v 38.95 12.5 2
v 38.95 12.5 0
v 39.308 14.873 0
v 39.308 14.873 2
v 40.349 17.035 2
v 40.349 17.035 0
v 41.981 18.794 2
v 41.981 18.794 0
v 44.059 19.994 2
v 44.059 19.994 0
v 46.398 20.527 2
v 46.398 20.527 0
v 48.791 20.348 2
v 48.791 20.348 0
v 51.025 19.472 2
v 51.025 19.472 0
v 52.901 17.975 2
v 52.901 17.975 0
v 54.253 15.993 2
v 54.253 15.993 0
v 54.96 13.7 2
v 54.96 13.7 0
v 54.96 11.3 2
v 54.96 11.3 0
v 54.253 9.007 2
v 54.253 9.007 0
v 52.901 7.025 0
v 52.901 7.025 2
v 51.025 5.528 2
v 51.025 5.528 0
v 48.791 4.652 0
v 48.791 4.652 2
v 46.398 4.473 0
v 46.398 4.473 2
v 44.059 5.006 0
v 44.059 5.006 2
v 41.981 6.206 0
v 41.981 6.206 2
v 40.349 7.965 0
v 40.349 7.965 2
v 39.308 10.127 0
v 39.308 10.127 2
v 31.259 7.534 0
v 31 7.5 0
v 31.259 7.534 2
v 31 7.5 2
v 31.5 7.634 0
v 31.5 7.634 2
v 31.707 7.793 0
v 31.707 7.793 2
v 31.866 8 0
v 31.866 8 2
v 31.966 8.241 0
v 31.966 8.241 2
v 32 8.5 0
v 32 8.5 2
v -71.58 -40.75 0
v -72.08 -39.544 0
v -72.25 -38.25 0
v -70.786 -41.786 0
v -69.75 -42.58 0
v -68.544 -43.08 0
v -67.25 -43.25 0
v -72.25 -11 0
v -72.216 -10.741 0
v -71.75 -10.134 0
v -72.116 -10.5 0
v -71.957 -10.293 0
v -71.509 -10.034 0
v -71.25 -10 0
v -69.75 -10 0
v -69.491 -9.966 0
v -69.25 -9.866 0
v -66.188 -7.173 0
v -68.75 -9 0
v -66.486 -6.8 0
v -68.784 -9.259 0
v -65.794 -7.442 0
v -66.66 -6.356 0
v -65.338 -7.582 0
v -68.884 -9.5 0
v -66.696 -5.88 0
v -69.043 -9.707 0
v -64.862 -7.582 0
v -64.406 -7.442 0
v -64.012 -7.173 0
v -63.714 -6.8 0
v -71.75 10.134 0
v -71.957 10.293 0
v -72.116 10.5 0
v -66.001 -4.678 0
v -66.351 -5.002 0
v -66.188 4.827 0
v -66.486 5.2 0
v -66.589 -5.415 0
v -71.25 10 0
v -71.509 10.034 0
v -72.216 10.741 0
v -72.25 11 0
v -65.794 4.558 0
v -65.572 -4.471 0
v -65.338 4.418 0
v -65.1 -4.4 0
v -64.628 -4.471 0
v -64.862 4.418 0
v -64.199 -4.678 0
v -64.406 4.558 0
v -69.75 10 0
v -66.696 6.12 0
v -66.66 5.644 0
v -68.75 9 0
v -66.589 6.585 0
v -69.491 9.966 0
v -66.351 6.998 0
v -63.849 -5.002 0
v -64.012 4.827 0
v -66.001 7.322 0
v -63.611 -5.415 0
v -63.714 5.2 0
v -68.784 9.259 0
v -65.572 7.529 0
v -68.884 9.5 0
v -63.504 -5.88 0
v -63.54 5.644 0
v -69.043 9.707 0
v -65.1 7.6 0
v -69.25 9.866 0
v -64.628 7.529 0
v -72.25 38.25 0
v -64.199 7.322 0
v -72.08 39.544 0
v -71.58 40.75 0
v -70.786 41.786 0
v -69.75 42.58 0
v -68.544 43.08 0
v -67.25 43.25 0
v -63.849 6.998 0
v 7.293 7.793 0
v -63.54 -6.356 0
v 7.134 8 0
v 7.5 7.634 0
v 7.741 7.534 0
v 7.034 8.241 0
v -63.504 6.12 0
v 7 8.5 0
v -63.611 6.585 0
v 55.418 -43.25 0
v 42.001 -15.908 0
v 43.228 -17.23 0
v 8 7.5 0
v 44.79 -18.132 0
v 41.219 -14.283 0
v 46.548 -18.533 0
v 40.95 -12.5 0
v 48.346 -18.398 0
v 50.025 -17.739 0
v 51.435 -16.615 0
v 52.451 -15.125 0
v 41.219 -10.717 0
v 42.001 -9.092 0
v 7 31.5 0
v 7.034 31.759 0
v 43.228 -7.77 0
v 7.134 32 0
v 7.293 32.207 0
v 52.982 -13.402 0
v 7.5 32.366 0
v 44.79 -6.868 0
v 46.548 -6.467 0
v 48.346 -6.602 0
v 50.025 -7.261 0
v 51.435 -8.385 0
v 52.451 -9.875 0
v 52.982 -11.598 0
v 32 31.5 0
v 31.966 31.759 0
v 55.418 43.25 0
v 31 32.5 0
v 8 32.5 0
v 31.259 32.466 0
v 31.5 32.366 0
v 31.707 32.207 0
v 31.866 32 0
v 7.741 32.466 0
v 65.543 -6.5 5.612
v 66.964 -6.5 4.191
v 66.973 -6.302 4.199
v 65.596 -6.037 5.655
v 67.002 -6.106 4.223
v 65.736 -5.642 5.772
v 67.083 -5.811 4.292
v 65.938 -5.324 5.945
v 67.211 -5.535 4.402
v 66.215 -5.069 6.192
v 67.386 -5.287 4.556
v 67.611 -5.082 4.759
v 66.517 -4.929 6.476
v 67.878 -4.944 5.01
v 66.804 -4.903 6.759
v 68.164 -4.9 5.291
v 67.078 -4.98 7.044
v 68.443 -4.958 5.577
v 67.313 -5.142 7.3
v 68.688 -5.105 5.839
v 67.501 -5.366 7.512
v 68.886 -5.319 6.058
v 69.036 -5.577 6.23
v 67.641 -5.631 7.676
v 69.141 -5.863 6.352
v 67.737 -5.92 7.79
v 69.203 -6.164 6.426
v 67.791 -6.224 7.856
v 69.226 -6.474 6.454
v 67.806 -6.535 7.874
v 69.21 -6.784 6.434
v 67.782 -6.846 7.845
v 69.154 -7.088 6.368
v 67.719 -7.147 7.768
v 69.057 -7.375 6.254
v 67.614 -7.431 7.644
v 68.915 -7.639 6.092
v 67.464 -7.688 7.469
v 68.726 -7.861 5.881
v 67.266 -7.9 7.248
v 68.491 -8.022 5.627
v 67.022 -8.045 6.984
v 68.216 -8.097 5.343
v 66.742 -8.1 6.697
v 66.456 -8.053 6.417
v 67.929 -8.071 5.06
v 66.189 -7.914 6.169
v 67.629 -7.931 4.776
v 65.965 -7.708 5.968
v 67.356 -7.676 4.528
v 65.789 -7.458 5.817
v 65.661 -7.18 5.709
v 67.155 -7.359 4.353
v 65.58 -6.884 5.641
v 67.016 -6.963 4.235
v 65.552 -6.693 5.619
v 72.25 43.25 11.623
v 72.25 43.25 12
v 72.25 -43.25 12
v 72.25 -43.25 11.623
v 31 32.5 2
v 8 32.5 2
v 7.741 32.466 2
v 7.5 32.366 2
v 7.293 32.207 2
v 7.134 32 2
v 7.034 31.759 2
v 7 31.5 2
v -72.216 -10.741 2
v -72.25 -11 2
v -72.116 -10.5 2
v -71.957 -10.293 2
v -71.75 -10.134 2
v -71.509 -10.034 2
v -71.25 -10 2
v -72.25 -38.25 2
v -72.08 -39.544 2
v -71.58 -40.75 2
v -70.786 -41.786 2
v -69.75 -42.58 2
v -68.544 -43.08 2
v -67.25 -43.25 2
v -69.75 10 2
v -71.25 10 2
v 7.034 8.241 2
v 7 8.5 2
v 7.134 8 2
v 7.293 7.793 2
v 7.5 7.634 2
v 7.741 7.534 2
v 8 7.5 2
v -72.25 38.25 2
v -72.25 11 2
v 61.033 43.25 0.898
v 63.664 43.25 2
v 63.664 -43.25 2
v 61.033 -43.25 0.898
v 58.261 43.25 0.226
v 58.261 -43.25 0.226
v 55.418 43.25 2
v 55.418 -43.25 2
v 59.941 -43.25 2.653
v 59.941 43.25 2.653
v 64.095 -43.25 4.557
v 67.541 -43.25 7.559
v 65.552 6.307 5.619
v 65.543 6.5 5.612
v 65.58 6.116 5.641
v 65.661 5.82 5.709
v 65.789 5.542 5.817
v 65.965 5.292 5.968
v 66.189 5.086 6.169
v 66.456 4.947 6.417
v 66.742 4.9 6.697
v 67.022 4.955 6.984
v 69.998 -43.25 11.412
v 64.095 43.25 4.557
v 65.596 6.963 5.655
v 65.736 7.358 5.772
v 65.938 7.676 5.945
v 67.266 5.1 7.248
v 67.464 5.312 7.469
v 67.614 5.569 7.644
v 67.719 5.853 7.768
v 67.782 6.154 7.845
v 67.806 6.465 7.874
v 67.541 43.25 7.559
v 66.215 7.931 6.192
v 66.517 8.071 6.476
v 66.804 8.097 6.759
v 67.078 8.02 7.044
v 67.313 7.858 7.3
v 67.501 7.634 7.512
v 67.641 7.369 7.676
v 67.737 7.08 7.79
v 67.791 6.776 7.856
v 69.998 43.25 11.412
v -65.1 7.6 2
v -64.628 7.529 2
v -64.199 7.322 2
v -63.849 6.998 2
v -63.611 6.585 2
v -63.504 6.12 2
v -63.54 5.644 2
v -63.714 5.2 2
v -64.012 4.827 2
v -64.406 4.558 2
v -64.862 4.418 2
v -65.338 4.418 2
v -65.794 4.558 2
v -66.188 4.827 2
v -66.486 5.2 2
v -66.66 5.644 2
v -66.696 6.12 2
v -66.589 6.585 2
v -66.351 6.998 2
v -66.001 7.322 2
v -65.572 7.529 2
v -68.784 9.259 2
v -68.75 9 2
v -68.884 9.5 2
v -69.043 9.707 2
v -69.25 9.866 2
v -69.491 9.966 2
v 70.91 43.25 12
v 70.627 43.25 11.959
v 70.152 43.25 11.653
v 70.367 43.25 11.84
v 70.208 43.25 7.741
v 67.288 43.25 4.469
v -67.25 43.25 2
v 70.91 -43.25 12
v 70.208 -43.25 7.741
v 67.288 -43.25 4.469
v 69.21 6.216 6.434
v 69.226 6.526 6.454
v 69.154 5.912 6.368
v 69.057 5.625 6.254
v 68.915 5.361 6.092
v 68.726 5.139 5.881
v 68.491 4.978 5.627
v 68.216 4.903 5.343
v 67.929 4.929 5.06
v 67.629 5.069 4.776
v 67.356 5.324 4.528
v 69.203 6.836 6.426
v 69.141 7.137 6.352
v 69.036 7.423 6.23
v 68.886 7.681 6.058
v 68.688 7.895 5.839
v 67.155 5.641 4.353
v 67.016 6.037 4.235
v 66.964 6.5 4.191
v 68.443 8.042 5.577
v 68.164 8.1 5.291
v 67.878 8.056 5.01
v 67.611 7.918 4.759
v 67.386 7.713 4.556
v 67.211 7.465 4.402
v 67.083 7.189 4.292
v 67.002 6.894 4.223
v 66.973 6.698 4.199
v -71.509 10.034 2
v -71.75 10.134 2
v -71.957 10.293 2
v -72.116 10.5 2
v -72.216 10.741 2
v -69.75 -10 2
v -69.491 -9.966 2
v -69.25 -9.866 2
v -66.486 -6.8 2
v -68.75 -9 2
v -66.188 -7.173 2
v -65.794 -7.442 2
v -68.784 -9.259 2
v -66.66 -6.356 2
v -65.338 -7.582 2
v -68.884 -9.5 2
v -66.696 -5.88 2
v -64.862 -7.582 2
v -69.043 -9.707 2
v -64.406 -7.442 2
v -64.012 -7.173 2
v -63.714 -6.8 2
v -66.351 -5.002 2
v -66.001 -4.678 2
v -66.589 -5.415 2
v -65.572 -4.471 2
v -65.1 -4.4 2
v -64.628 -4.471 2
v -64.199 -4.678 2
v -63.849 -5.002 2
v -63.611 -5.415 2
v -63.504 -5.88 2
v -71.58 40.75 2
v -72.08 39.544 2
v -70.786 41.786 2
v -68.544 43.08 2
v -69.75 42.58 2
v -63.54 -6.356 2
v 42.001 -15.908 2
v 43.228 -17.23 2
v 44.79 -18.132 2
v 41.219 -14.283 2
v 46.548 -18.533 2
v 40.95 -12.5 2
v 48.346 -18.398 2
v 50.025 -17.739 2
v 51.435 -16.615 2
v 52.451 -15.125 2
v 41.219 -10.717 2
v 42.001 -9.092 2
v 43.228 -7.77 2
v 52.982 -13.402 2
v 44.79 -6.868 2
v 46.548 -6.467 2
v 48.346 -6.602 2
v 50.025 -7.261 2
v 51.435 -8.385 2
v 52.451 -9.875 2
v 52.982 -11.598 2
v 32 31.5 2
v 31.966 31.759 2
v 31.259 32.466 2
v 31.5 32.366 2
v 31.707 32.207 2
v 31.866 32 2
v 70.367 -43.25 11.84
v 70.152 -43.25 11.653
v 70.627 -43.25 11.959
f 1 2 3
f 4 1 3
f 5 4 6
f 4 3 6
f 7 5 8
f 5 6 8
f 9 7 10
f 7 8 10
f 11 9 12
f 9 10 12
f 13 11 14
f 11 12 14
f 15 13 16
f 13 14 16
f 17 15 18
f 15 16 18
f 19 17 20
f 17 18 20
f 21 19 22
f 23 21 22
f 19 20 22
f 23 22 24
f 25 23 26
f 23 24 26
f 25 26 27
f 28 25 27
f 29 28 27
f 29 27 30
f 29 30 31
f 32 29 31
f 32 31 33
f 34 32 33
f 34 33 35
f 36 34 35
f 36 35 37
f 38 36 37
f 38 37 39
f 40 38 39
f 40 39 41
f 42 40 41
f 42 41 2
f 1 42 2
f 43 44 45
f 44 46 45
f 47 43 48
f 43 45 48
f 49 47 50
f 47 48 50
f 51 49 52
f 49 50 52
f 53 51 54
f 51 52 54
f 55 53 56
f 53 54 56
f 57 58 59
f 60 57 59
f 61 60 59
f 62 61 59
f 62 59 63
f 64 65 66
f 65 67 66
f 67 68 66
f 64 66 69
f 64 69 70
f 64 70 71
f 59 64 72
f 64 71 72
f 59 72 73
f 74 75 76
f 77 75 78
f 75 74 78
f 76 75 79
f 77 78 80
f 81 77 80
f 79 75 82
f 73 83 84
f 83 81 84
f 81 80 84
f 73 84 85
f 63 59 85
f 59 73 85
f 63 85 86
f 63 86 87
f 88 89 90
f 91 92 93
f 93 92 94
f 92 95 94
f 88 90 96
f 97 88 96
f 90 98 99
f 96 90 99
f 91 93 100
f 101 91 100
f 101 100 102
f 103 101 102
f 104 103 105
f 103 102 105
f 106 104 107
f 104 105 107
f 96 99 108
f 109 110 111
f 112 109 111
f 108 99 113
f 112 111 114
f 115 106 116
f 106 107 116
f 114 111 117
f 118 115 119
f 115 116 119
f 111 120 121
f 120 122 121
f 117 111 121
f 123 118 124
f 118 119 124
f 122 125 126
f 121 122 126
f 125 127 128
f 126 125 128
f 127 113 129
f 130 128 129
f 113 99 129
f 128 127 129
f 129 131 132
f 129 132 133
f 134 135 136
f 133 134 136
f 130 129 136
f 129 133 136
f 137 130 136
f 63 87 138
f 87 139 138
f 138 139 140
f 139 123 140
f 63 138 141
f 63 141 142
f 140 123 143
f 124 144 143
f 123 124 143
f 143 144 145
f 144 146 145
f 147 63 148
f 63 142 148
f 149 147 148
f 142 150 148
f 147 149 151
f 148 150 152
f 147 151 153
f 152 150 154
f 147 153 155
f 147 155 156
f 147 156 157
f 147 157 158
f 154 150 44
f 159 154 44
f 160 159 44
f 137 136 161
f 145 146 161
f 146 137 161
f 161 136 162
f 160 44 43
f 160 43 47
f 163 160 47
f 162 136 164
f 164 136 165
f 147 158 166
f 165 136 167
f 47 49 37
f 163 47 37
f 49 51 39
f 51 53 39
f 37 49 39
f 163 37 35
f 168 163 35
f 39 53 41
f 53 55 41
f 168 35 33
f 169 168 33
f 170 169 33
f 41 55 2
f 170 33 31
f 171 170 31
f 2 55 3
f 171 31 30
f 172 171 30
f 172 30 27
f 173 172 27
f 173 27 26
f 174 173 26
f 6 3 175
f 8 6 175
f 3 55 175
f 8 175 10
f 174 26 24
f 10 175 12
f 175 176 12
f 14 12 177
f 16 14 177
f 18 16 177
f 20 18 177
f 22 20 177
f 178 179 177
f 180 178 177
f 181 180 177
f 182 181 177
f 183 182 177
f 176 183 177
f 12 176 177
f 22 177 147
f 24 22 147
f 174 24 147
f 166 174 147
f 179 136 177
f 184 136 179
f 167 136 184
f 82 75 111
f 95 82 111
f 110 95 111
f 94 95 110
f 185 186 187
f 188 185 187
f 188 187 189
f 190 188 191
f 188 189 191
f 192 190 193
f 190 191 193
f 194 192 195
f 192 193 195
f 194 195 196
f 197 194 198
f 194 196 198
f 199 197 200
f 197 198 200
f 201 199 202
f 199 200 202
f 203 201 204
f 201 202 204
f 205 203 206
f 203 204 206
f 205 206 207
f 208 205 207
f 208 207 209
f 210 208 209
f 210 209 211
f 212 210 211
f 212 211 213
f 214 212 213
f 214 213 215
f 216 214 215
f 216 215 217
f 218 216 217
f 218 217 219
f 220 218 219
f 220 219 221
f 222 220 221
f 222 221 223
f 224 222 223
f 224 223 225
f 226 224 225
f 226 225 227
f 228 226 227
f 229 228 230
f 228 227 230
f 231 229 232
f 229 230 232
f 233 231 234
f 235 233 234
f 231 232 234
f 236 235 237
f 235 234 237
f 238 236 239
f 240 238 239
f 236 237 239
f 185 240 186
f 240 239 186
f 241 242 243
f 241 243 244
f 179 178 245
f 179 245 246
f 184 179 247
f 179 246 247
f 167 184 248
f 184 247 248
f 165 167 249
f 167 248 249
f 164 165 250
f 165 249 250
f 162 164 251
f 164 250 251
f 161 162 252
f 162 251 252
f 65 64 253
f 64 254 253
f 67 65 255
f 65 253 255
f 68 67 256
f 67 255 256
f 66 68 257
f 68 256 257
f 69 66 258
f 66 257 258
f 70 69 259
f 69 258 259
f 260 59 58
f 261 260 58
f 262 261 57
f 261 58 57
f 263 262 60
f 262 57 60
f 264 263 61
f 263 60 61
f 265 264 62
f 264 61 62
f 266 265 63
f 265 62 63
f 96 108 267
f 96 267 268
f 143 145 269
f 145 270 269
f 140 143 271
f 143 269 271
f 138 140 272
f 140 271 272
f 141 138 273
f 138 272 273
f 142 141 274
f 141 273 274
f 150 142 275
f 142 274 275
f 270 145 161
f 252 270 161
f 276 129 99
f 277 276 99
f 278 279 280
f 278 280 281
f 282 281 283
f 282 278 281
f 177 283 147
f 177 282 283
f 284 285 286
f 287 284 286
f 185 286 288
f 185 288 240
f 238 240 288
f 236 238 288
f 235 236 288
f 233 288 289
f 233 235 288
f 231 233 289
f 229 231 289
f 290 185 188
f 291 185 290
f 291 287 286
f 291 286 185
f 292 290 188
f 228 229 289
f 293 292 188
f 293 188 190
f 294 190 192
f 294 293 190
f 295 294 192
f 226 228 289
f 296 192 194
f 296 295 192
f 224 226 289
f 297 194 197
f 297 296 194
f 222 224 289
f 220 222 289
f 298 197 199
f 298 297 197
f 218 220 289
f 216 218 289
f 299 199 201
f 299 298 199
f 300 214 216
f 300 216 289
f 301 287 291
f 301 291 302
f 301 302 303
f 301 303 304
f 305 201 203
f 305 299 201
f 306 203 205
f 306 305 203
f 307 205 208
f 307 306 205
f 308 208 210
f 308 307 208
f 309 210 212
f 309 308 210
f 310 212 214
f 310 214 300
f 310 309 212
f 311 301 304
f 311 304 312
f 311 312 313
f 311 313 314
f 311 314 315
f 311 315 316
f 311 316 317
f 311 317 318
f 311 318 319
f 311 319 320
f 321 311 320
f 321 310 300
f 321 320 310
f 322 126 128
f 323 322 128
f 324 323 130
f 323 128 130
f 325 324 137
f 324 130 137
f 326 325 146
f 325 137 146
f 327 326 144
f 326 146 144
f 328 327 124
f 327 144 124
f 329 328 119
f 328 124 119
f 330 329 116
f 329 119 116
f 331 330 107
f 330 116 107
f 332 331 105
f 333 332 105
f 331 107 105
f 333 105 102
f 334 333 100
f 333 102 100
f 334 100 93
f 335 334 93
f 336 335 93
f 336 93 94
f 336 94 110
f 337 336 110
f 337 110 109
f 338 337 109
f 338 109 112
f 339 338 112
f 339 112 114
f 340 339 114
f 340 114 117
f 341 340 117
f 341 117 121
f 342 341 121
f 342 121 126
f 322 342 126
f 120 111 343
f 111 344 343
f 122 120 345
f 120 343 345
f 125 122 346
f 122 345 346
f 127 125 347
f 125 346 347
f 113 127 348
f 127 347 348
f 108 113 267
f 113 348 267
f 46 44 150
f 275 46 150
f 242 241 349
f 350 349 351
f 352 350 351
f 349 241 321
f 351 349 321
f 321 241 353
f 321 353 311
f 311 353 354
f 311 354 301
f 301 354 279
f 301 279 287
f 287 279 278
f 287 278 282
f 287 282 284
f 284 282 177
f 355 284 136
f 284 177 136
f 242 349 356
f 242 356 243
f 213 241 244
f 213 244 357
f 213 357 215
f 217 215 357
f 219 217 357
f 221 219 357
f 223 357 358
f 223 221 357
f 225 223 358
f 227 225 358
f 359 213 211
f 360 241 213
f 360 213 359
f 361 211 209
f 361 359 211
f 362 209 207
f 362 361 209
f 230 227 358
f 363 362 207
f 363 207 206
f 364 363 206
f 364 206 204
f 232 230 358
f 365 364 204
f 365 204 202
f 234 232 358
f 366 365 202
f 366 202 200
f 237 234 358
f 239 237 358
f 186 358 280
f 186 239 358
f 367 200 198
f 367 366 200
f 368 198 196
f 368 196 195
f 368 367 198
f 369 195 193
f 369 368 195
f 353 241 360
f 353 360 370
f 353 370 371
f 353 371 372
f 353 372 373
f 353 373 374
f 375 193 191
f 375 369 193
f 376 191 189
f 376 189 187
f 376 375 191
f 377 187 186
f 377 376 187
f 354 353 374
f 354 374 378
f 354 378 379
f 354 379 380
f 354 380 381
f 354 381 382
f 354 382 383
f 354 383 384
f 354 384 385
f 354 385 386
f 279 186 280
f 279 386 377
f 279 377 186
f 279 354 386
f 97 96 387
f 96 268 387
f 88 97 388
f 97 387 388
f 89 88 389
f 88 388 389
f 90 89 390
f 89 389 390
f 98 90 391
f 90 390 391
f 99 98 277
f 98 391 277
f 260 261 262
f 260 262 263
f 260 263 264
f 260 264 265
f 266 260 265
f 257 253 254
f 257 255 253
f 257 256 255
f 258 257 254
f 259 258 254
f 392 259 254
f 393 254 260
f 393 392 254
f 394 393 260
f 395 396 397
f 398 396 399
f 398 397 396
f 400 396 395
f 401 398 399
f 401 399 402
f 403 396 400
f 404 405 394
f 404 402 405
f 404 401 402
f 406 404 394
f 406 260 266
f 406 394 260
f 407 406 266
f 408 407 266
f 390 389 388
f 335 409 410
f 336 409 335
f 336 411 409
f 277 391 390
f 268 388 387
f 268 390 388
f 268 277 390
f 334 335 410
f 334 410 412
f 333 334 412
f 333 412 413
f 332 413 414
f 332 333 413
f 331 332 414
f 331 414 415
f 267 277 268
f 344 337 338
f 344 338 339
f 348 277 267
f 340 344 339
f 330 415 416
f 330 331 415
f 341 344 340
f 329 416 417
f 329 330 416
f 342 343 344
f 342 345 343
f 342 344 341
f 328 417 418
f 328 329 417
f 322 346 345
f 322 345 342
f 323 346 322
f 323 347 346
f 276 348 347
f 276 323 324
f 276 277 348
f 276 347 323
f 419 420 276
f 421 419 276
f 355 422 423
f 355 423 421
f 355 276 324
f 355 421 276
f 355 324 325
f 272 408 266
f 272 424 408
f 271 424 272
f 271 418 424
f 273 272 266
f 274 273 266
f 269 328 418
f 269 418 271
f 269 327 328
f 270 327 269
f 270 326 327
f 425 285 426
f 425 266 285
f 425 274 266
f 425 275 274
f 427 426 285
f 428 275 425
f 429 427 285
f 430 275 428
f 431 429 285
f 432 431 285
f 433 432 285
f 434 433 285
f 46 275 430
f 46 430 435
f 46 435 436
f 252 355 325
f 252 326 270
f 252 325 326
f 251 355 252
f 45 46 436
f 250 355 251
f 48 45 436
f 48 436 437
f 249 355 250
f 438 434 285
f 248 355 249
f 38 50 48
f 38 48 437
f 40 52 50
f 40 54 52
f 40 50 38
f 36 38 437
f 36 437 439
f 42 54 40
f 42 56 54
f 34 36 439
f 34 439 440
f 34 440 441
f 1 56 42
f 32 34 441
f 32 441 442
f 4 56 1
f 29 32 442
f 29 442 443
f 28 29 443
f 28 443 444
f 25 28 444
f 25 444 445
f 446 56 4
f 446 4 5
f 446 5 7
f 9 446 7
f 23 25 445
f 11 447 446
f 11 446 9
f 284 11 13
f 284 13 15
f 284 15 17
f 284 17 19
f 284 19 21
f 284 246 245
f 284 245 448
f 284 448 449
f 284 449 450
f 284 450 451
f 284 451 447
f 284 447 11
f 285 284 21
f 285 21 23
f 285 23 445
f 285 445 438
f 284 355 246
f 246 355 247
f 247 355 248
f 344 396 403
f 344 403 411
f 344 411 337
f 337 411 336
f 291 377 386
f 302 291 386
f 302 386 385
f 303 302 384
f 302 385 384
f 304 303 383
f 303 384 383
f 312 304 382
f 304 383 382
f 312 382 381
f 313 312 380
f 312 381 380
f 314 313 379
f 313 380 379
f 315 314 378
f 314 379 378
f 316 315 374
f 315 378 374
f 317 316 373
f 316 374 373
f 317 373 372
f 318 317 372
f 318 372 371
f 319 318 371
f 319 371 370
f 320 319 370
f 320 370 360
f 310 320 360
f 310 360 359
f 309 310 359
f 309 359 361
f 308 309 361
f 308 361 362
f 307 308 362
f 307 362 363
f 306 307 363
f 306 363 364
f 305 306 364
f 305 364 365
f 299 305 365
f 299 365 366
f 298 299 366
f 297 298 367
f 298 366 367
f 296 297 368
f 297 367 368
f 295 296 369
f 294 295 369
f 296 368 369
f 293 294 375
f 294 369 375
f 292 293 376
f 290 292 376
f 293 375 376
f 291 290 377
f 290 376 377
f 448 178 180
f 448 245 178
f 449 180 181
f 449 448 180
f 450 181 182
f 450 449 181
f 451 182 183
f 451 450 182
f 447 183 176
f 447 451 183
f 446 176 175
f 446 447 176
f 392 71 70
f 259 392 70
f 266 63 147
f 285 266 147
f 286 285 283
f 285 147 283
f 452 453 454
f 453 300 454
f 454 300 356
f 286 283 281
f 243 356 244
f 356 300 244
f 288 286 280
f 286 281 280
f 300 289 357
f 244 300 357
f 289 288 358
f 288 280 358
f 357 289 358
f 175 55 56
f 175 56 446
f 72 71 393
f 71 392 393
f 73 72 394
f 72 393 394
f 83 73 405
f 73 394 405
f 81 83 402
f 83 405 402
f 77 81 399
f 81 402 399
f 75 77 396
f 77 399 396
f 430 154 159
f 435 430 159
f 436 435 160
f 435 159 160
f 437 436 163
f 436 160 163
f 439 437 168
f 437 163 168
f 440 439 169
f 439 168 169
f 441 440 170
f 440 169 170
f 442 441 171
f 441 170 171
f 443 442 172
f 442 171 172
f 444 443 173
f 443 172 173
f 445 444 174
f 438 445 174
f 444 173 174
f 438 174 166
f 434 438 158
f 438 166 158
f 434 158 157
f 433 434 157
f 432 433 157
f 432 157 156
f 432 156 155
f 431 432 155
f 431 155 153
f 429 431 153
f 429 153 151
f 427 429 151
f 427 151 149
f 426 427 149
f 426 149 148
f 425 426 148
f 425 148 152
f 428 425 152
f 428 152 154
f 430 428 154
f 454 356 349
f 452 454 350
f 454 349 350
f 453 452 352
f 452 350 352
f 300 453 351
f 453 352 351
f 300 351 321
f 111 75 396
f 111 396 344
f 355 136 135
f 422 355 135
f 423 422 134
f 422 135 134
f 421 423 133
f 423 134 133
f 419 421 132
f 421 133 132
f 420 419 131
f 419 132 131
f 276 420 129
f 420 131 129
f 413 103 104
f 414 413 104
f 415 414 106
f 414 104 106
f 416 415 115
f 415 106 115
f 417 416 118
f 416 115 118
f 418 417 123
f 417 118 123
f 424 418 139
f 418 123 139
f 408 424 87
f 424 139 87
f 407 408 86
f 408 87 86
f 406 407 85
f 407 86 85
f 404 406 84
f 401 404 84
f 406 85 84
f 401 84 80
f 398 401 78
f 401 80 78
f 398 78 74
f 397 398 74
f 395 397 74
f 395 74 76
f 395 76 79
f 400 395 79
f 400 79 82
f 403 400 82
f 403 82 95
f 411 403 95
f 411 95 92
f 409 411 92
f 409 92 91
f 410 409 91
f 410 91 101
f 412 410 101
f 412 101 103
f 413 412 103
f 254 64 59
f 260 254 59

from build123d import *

# Parameters (mm, degrees)
EXTRUDE_1_DEPTH             = 2
EXTRUDE_2_REACH             = 86.23
EXTRUDE_2_DIRECTION_2_REACH = 86.23
CUT_EXTRUDE_2_DEPTH         = 114.341574455
FILLET_2_R                  = 1
SKETCH_8_R                  = 1.6
CUT_EXTRUDE_3_DEPTH         = 121.450189292
SKETCH_10_R                 = 1.6
SKETCH_10_W                 = 3.5
SKETCH_10_H                 = 20
CUT_EXTRUDE_5_DEPTH         = 86.056598939
SKETCH_11_R                 = 8.05
SKETCH_11_R_2               = 6.05
CUT_EXTRUDE_6_DEPTH         = 86.056598939
SKETCH_12_W                 = 25
SKETCH_12_H                 = 25
CUT_EXTRUDE_7_DEPTH         = 86.056598939
FILLET_3_R                  = 1


with BuildPart() as part:
    # 草图1 → 凸台-拉伸1 (new body)
    with BuildSketch(Plane.XY):
        with BuildLine():
            Line((72.25, -38.25), (72.25, 38.25))
            ThreePointArc((72.25, 38.25), (70.785533906, 41.785533906), (67.25, 43.25))
            Line((67.25, 43.25), (-67.25, 43.25))
            ThreePointArc((-67.25, 43.25), (-70.785533906, 41.785533906), (-72.25, 38.25))
            Line((-72.25, 38.25), (-72.25, -38.25))
            ThreePointArc((-72.25, -38.25), (-70.785533906, -41.785533906), (-67.25, -43.25))
            Line((-67.25, -43.25), (67.25, -43.25))
            ThreePointArc((67.25, -43.25), (70.785533906, -41.785533906), (72.25, -38.25))
        make_face()
    extrude(amount=EXTRUDE_1_DEPTH)

    # 凸台-拉伸2: up to this face of the body (flat: up to its plane)
    extrude_2_end = Plane(part.part.faces().sort_by_distance((0, 43.25, 1))[0])
    # 草图3 → 凸台-拉伸2 (add, up to the picked face)
    with BuildSketch(Plane(origin=(0, 0, 0), x_dir=(1, 0, 0), z_dir=(0, 1, 0)), mode=Mode.PRIVATE) as extrude_2_sk1:
        with BuildLine():
            Line((55.417603026, 0), (55.417603026, -2))
            ThreePointArc((55.417603026, -2), (64.361874936, -4.733500839), (70.25, -12))
            Line((70.25, -12), (72.25, -12))
            Line((72.25, -12), (72.25, -11.622664185))
            ThreePointArc((72.25, -11.622664185), (65.645211625, -3.187977102), (55.417603026, 0))
        make_face()
    extrude_2_tool1 = split(extrude(extrude_2_sk1.sketch, amount=EXTRUDE_2_REACH, mode=Mode.PRIVATE), bisect_by=extrude_2_end, keep=Keep.BOTH, mode=Mode.PRIVATE)
    add(extrude_2_tool1.solids().sort_by(Axis((64.519337, 0, 4.83454), (0, 1, 0)))[0])

    # 凸台-拉伸2 direction 2: up to this face of the body (flat: up to its plane)
    extrude_2_direction_2_end = Plane(part.part.faces().sort_by_distance((0, -43.25, 1))[0])
    # 草图3 → 凸台-拉伸2 direction 2 (add, up to the picked face)
    with BuildSketch(Plane(origin=(0, 0, 0), x_dir=(1, 0, 0), z_dir=(0, 1, 0)), mode=Mode.PRIVATE) as extrude_2_direction_2_sk1:
        with BuildLine():
            Line((55.417603026, 0), (55.417603026, -2))
            ThreePointArc((55.417603026, -2), (64.361874936, -4.733500839), (70.25, -12))
            Line((70.25, -12), (72.25, -12))
            Line((72.25, -12), (72.25, -11.622664185))
            ThreePointArc((72.25, -11.622664185), (65.645211625, -3.187977102), (55.417603026, 0))
        make_face()
    extrude_2_direction_2_tool1 = split(extrude(extrude_2_direction_2_sk1.sketch, amount=-EXTRUDE_2_DIRECTION_2_REACH, mode=Mode.PRIVATE), bisect_by=extrude_2_direction_2_end, keep=Keep.BOTH, mode=Mode.PRIVATE)
    add(extrude_2_direction_2_tool1.solids().sort_by(Axis((64.519337, 0, 4.83454), (0, -1, 0)))[0])

    # 草图6 → 切除-拉伸2 (cut, through all)
    with BuildSketch(Plane(origin=(0, 43.25, 0), x_dir=(1, 0, 0), z_dir=(0, 1, 0))):
        with BuildLine():
            Line((55.417603026, 0), (72.25, 0))
            Line((72.25, 0), (72.25, -2))
            Line((72.25, -2), (63.663814277, -2))
            ThreePointArc((63.663814277, -2), (59.660243713, -0.507144315), (55.417603026, 0))
        make_face()
    extrude(amount=-CUT_EXTRUDE_2_DEPTH, mode=Mode.SUBTRACT)

    # 圆角2
    fillet_2_edges = [part.edges().sort_by_distance(p)[0] for p in [
        (70.25, 0, 12),
    ]]
    fillet(fillet_2_edges, radius=FILLET_2_R)

    # 草图8 → 切除-拉伸3 (cut, through all)
    with BuildSketch(Plane(origin=(31.436723574, 0, -31.436723574), x_dir=(-0.7071067811865464, 0, -0.7071067811865488), z_dir=(0.7071067811865488, 0, -0.7071067811865464))):
        with Locations((-51.914084958, 6.5)):
            Circle(SKETCH_8_R)
        with Locations((-51.914084958, -6.5)):
            Circle(SKETCH_8_R)
    extrude(amount=-CUT_EXTRUDE_3_DEPTH, mode=Mode.SUBTRACT)

    # 草图10 → 切除-拉伸5 (cut, through all)
    with BuildSketch(Plane(origin=(0, 0, 0), x_dir=(-1, 0, 0), z_dir=(0, 0, -1))):
        with Locations(Location((65.1, 6, 0), (0, 0, 90))):
            Circle(SKETCH_10_R)
        with Locations(Location((65.1, -6, 0), (0, 0, 90))):
            Circle(SKETCH_10_R)
        with Locations((70.5, 0)):
            Rectangle(SKETCH_10_W, SKETCH_10_H)
    extrude(amount=-CUT_EXTRUDE_5_DEPTH, mode=Mode.SUBTRACT)

    # 草图11 → 切除-拉伸6 (cut, through all)
    with BuildSketch(Plane(origin=(0, 0, 0), x_dir=(-1, 0, 0), z_dir=(0, 0, -1))):
        with Locations((-47, 12.5)):
            Circle(SKETCH_11_R)
        with Locations((-47, -12.5)):
            Circle(SKETCH_11_R_2)
    extrude(amount=-CUT_EXTRUDE_6_DEPTH, mode=Mode.SUBTRACT)

    # 草图12 → 切除-拉伸7 (cut, through all)
    with BuildSketch(Plane(origin=(0, 0, 0), x_dir=(-1, 0, 0), z_dir=(0, 0, -1))):
        with Locations((-19.5, 20)):
            Rectangle(SKETCH_12_W, SKETCH_12_H)
    extrude(amount=-CUT_EXTRUDE_7_DEPTH, mode=Mode.SUBTRACT)

    # 圆角3
    fillet_3_edges = [part.edges().sort_by_distance(p)[0] for p in [
        (-72.25, 10, 1),
        (-72.25, -10, 1),
        (-68.75, -10, 1),
        (-68.75, 10, 1),
        (7, 32.5, 1),
        (7, 7.5, 1),
        (32, 7.5, 1),
        (32, 32.5, 1),
    ]]
    fillet(fillet_3_edges, radius=FILLET_3_R)


solid = part.part
